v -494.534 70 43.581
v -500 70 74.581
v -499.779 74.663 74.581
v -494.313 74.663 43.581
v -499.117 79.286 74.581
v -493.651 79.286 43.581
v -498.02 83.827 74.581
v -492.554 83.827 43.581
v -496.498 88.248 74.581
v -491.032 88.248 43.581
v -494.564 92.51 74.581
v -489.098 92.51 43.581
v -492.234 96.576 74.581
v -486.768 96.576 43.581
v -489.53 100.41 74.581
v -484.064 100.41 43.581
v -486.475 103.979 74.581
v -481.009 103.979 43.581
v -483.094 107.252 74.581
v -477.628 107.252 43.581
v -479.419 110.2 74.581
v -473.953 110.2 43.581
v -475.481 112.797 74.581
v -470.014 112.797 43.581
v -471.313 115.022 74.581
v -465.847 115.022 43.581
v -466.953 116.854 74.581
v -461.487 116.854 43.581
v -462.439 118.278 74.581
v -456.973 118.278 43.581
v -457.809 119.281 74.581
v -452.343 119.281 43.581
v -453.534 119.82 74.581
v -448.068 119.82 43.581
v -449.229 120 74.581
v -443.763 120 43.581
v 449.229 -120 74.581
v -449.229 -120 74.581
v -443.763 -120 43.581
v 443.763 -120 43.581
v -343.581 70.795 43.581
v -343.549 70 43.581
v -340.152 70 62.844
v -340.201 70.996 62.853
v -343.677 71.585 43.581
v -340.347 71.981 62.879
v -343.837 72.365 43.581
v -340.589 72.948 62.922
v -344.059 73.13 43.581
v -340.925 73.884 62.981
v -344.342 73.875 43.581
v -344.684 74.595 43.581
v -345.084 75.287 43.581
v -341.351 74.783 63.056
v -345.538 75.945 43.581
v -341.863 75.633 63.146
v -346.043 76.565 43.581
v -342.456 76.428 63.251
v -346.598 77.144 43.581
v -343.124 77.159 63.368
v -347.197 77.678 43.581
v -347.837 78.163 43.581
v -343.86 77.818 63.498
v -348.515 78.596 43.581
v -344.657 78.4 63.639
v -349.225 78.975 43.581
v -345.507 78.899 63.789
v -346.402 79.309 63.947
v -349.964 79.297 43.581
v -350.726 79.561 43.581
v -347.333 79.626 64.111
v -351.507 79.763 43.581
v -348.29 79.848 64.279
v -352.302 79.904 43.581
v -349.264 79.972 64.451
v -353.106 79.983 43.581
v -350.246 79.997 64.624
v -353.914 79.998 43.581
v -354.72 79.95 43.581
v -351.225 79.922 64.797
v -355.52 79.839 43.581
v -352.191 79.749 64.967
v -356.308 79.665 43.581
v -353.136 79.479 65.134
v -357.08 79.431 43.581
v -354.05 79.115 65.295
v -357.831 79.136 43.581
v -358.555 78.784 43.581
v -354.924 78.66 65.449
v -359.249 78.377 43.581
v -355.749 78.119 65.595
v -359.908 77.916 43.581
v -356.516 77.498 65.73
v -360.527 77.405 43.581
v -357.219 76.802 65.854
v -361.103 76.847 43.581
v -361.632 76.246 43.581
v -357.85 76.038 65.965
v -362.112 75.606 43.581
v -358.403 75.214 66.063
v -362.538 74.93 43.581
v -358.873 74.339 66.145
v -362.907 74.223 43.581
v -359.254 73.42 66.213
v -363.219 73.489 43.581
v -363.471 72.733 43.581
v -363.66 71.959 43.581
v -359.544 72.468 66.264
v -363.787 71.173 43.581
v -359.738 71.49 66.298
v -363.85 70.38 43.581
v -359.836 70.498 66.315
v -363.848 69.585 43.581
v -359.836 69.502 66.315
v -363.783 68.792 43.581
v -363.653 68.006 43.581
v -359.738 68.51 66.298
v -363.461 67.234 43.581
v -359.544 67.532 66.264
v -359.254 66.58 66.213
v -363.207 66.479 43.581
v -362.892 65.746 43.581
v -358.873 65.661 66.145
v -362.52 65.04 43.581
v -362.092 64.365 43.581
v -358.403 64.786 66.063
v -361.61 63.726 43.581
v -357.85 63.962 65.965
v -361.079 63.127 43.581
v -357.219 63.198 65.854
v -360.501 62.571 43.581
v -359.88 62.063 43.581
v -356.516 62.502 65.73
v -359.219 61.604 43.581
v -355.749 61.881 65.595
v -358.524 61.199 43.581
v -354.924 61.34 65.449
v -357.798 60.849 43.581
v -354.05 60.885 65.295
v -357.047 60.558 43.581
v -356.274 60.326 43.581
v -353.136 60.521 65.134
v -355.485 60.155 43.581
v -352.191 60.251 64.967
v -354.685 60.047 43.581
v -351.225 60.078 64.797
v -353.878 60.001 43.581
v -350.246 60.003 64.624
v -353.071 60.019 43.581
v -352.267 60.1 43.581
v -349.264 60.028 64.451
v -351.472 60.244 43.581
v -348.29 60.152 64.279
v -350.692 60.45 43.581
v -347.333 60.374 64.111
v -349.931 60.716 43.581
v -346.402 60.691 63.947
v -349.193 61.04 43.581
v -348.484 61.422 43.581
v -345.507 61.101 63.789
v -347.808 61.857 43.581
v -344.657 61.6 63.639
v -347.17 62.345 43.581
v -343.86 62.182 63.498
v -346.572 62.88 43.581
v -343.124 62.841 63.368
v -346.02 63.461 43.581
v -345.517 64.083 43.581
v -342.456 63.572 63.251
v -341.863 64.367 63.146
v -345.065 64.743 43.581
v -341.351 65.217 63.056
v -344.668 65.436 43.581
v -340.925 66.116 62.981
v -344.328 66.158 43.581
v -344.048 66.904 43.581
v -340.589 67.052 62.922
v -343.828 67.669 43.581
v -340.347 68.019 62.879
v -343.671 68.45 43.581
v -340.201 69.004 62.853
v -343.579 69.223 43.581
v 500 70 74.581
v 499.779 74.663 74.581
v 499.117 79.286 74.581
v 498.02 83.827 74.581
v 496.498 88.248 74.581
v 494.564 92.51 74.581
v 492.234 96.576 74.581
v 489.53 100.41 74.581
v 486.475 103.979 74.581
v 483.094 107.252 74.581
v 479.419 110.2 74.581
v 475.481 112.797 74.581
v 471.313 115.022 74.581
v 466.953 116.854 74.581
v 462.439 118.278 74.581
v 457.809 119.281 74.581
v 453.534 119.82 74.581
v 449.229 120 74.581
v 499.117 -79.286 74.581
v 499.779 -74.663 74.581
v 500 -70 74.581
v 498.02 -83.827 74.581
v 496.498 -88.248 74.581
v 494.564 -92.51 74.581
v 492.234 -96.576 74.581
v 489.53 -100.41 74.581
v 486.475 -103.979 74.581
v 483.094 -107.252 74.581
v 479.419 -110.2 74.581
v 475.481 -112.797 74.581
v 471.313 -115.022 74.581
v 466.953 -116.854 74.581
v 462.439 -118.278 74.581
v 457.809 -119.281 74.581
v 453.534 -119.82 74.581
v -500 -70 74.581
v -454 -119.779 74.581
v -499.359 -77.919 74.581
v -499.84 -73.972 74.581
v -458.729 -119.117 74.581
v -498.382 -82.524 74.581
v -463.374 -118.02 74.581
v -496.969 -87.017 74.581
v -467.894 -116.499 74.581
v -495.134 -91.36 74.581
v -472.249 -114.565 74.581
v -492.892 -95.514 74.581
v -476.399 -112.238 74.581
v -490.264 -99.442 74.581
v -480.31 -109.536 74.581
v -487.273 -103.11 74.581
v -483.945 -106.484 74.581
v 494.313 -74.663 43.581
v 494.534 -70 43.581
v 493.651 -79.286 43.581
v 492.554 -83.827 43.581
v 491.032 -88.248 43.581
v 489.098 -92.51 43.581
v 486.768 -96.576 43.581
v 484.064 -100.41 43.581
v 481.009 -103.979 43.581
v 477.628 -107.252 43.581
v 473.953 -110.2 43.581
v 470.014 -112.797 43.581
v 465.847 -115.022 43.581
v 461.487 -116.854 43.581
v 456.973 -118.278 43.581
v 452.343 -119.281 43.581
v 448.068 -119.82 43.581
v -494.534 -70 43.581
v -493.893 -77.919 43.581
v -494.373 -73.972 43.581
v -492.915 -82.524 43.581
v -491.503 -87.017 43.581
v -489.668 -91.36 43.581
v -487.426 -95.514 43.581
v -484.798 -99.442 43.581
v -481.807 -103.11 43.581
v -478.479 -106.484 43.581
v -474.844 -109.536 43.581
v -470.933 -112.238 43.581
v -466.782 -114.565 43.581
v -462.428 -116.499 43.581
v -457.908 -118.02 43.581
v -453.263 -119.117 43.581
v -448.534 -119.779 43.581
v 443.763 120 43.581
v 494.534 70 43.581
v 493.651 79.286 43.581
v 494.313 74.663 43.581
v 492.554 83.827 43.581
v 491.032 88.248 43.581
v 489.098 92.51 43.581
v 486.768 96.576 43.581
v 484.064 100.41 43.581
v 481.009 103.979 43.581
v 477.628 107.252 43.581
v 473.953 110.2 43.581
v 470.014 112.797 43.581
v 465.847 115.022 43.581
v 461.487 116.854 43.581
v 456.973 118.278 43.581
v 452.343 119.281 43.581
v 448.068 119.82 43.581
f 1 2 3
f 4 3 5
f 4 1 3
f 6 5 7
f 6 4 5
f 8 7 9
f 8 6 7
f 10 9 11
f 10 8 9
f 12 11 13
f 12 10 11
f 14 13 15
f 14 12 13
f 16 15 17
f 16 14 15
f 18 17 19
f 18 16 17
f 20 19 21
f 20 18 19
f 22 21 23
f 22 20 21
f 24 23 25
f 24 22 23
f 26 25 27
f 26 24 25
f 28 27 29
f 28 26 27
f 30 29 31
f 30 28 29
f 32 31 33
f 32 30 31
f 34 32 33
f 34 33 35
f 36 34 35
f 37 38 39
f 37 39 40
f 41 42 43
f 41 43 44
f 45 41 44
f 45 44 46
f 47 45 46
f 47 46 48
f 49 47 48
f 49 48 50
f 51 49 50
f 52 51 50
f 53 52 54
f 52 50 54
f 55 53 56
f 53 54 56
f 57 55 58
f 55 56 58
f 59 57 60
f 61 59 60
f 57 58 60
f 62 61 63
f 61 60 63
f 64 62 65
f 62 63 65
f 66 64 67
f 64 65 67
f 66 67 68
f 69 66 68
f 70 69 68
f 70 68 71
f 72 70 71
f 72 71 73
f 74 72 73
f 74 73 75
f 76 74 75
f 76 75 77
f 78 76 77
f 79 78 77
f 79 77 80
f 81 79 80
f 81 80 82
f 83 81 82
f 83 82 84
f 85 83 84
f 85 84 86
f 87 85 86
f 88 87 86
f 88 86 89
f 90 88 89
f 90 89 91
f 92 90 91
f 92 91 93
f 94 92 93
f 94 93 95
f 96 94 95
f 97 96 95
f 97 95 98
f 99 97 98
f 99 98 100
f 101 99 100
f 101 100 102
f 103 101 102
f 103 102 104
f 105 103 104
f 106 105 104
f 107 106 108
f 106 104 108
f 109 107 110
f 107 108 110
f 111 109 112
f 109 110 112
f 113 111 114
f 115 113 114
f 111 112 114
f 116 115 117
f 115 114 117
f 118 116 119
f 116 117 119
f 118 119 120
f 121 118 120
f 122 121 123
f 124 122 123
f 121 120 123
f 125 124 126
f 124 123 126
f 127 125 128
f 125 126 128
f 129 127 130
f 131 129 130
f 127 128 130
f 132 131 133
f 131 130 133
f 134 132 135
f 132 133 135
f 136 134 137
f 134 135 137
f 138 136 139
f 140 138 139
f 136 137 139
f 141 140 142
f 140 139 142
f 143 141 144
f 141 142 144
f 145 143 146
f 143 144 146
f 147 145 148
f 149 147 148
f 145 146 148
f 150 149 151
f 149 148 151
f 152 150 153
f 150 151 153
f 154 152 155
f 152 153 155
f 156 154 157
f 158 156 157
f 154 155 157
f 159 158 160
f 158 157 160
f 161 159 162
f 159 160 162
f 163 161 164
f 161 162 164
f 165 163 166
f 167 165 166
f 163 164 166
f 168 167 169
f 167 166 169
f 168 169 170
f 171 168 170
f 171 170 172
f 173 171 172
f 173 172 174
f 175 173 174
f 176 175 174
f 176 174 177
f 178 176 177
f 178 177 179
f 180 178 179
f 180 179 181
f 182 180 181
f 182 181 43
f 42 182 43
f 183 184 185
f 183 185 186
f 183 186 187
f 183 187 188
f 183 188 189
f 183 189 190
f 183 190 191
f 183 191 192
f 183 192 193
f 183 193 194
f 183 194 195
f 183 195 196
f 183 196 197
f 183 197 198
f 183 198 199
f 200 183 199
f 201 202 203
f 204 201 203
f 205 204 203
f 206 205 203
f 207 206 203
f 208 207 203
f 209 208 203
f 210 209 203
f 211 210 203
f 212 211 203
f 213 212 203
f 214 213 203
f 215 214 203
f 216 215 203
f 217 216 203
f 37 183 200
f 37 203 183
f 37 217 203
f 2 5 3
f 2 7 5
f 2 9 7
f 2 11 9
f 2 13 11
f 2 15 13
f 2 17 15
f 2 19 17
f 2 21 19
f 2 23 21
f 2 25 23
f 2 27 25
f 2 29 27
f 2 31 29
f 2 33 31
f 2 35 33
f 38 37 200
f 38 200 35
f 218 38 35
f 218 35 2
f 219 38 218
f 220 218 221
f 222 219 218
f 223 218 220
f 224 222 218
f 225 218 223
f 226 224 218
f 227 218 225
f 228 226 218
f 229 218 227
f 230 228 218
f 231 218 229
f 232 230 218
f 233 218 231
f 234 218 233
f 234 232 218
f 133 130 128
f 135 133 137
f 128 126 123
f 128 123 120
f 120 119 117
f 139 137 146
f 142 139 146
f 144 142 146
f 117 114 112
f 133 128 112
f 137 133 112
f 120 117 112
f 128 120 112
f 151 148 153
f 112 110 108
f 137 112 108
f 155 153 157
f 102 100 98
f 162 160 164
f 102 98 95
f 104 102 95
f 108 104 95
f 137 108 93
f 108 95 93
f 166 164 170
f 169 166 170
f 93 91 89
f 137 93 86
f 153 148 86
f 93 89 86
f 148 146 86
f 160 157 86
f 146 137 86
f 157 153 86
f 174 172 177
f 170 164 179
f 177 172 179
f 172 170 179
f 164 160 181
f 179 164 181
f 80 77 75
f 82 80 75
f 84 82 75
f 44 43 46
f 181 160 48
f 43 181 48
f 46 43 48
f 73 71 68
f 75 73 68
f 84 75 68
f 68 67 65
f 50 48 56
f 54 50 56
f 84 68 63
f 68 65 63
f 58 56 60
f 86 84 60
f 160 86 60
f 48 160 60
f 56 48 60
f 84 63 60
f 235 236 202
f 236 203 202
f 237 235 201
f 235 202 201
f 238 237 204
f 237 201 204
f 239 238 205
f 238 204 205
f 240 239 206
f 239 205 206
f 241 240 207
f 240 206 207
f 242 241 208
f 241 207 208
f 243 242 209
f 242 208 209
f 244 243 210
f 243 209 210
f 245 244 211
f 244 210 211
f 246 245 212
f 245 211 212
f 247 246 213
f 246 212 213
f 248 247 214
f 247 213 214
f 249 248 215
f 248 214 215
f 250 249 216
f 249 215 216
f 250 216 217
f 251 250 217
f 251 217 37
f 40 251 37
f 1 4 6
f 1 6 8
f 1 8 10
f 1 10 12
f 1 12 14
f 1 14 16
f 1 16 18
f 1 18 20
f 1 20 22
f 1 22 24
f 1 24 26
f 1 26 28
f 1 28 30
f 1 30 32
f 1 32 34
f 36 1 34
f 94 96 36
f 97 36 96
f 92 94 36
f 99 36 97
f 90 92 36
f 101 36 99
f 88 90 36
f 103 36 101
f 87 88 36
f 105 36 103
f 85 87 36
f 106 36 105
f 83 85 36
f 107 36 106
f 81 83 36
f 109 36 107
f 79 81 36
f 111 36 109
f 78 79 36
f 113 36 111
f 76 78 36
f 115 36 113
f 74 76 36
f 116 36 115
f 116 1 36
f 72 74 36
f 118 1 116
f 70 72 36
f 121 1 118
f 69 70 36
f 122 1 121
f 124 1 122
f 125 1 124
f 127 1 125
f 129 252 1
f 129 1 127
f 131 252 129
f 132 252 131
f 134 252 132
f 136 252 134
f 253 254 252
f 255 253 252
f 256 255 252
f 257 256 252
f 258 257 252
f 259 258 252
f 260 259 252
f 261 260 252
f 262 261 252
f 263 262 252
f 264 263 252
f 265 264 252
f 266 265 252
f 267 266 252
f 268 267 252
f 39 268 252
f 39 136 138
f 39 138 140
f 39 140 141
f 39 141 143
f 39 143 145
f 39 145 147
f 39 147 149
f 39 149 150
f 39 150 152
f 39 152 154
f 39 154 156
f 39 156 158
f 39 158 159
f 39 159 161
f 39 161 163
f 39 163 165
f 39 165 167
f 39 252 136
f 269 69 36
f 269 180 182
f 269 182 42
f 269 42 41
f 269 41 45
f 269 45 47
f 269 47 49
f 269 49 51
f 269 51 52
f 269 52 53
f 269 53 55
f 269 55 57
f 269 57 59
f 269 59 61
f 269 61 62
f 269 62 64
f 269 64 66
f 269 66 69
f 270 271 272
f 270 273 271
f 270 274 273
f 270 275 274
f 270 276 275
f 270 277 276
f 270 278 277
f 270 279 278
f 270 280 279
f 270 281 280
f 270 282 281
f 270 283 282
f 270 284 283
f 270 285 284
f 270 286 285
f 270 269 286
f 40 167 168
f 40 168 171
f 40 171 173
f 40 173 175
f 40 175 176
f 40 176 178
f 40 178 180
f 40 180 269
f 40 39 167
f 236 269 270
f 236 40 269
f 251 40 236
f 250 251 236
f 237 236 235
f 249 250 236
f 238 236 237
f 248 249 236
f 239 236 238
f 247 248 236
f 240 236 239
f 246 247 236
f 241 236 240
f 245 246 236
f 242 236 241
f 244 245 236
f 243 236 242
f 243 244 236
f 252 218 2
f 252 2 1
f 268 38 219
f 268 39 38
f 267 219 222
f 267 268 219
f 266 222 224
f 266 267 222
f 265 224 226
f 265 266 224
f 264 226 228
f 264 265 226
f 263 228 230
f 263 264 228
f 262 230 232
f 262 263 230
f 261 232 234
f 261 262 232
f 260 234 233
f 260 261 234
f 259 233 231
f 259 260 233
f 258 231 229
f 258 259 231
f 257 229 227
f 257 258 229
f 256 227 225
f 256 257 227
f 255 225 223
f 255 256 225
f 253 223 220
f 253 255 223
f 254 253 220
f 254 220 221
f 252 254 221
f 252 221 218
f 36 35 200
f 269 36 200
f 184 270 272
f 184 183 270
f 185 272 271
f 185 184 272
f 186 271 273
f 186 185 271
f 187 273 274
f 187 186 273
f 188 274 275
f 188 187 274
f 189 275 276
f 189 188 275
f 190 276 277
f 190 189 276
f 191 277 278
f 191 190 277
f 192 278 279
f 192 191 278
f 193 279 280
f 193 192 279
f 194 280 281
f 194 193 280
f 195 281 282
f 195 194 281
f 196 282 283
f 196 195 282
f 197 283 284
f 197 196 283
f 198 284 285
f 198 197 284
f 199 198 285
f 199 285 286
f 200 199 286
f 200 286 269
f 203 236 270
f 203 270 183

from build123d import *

# Parameters (mm, degrees)
F1_DEPTH  = 120
F3_R      = 50
F4_R      = 50
F5_R      = 50
F6_R      = 50
F10_R     = 10
F11_DEPTH = 46.7291894633


with BuildPart() as f1:
    # F0 (on Front) → F1 (new body)
    with BuildSketch(Plane.XZ):
        Polygon((500, 74.5809494637), (0, 74.5809494637), (-500, 74.5809494637), (-494.533863598, 43.5809494637), (0, 43.5809494637), (494.533863598, 43.5809494637), align=None)
    extrude(amount=F1_DEPTH)

    # F2: F1 across plane


with BuildPart() as f1_1:
    add(f1.part)
    add(f1.part.mirror(Plane.XZ))

    # F3
    f3_edges = [f1_1.edges().sort_by_distance(p)[0] for p in [
        (497.266932, -120, 59.080949),
    ]]
    fillet(f3_edges, radius=F3_R)

    # F4
    f4_edges = [f1_1.edges().sort_by_distance(p)[0] for p in [
        (497.266932, 120, 59.080949),
    ]]
    fillet(f4_edges, radius=F4_R)

    # F5
    f5_edges = [f1_1.edges().sort_by_distance(p)[0] for p in [
        (-497.266932, -120, 59.080949),
    ]]
    fillet(f5_edges, radius=F5_R)

    # F6
    f6_edges = [f1_1.edges().sort_by_distance(p)[0] for p in [
        (-497.266932, 120, 59.080949),
    ]]
    fillet(f6_edges, radius=F6_R)

    # F10 (on line) → F11 (cut, through all)
    with BuildSketch(Plane(origin=(0.4902014334, 0, 2.7800704771), x_dir=(0.984807753, 0, -0.1736481777), z_dir=(0.1736481777, 0, 0.984807753))):
        with Locations((-355.8970777407, 70)):
            Circle(F10_R)
    extrude(amount=-F11_DEPTH, mode=Mode.SUBTRACT)


solid = f1_1.part
